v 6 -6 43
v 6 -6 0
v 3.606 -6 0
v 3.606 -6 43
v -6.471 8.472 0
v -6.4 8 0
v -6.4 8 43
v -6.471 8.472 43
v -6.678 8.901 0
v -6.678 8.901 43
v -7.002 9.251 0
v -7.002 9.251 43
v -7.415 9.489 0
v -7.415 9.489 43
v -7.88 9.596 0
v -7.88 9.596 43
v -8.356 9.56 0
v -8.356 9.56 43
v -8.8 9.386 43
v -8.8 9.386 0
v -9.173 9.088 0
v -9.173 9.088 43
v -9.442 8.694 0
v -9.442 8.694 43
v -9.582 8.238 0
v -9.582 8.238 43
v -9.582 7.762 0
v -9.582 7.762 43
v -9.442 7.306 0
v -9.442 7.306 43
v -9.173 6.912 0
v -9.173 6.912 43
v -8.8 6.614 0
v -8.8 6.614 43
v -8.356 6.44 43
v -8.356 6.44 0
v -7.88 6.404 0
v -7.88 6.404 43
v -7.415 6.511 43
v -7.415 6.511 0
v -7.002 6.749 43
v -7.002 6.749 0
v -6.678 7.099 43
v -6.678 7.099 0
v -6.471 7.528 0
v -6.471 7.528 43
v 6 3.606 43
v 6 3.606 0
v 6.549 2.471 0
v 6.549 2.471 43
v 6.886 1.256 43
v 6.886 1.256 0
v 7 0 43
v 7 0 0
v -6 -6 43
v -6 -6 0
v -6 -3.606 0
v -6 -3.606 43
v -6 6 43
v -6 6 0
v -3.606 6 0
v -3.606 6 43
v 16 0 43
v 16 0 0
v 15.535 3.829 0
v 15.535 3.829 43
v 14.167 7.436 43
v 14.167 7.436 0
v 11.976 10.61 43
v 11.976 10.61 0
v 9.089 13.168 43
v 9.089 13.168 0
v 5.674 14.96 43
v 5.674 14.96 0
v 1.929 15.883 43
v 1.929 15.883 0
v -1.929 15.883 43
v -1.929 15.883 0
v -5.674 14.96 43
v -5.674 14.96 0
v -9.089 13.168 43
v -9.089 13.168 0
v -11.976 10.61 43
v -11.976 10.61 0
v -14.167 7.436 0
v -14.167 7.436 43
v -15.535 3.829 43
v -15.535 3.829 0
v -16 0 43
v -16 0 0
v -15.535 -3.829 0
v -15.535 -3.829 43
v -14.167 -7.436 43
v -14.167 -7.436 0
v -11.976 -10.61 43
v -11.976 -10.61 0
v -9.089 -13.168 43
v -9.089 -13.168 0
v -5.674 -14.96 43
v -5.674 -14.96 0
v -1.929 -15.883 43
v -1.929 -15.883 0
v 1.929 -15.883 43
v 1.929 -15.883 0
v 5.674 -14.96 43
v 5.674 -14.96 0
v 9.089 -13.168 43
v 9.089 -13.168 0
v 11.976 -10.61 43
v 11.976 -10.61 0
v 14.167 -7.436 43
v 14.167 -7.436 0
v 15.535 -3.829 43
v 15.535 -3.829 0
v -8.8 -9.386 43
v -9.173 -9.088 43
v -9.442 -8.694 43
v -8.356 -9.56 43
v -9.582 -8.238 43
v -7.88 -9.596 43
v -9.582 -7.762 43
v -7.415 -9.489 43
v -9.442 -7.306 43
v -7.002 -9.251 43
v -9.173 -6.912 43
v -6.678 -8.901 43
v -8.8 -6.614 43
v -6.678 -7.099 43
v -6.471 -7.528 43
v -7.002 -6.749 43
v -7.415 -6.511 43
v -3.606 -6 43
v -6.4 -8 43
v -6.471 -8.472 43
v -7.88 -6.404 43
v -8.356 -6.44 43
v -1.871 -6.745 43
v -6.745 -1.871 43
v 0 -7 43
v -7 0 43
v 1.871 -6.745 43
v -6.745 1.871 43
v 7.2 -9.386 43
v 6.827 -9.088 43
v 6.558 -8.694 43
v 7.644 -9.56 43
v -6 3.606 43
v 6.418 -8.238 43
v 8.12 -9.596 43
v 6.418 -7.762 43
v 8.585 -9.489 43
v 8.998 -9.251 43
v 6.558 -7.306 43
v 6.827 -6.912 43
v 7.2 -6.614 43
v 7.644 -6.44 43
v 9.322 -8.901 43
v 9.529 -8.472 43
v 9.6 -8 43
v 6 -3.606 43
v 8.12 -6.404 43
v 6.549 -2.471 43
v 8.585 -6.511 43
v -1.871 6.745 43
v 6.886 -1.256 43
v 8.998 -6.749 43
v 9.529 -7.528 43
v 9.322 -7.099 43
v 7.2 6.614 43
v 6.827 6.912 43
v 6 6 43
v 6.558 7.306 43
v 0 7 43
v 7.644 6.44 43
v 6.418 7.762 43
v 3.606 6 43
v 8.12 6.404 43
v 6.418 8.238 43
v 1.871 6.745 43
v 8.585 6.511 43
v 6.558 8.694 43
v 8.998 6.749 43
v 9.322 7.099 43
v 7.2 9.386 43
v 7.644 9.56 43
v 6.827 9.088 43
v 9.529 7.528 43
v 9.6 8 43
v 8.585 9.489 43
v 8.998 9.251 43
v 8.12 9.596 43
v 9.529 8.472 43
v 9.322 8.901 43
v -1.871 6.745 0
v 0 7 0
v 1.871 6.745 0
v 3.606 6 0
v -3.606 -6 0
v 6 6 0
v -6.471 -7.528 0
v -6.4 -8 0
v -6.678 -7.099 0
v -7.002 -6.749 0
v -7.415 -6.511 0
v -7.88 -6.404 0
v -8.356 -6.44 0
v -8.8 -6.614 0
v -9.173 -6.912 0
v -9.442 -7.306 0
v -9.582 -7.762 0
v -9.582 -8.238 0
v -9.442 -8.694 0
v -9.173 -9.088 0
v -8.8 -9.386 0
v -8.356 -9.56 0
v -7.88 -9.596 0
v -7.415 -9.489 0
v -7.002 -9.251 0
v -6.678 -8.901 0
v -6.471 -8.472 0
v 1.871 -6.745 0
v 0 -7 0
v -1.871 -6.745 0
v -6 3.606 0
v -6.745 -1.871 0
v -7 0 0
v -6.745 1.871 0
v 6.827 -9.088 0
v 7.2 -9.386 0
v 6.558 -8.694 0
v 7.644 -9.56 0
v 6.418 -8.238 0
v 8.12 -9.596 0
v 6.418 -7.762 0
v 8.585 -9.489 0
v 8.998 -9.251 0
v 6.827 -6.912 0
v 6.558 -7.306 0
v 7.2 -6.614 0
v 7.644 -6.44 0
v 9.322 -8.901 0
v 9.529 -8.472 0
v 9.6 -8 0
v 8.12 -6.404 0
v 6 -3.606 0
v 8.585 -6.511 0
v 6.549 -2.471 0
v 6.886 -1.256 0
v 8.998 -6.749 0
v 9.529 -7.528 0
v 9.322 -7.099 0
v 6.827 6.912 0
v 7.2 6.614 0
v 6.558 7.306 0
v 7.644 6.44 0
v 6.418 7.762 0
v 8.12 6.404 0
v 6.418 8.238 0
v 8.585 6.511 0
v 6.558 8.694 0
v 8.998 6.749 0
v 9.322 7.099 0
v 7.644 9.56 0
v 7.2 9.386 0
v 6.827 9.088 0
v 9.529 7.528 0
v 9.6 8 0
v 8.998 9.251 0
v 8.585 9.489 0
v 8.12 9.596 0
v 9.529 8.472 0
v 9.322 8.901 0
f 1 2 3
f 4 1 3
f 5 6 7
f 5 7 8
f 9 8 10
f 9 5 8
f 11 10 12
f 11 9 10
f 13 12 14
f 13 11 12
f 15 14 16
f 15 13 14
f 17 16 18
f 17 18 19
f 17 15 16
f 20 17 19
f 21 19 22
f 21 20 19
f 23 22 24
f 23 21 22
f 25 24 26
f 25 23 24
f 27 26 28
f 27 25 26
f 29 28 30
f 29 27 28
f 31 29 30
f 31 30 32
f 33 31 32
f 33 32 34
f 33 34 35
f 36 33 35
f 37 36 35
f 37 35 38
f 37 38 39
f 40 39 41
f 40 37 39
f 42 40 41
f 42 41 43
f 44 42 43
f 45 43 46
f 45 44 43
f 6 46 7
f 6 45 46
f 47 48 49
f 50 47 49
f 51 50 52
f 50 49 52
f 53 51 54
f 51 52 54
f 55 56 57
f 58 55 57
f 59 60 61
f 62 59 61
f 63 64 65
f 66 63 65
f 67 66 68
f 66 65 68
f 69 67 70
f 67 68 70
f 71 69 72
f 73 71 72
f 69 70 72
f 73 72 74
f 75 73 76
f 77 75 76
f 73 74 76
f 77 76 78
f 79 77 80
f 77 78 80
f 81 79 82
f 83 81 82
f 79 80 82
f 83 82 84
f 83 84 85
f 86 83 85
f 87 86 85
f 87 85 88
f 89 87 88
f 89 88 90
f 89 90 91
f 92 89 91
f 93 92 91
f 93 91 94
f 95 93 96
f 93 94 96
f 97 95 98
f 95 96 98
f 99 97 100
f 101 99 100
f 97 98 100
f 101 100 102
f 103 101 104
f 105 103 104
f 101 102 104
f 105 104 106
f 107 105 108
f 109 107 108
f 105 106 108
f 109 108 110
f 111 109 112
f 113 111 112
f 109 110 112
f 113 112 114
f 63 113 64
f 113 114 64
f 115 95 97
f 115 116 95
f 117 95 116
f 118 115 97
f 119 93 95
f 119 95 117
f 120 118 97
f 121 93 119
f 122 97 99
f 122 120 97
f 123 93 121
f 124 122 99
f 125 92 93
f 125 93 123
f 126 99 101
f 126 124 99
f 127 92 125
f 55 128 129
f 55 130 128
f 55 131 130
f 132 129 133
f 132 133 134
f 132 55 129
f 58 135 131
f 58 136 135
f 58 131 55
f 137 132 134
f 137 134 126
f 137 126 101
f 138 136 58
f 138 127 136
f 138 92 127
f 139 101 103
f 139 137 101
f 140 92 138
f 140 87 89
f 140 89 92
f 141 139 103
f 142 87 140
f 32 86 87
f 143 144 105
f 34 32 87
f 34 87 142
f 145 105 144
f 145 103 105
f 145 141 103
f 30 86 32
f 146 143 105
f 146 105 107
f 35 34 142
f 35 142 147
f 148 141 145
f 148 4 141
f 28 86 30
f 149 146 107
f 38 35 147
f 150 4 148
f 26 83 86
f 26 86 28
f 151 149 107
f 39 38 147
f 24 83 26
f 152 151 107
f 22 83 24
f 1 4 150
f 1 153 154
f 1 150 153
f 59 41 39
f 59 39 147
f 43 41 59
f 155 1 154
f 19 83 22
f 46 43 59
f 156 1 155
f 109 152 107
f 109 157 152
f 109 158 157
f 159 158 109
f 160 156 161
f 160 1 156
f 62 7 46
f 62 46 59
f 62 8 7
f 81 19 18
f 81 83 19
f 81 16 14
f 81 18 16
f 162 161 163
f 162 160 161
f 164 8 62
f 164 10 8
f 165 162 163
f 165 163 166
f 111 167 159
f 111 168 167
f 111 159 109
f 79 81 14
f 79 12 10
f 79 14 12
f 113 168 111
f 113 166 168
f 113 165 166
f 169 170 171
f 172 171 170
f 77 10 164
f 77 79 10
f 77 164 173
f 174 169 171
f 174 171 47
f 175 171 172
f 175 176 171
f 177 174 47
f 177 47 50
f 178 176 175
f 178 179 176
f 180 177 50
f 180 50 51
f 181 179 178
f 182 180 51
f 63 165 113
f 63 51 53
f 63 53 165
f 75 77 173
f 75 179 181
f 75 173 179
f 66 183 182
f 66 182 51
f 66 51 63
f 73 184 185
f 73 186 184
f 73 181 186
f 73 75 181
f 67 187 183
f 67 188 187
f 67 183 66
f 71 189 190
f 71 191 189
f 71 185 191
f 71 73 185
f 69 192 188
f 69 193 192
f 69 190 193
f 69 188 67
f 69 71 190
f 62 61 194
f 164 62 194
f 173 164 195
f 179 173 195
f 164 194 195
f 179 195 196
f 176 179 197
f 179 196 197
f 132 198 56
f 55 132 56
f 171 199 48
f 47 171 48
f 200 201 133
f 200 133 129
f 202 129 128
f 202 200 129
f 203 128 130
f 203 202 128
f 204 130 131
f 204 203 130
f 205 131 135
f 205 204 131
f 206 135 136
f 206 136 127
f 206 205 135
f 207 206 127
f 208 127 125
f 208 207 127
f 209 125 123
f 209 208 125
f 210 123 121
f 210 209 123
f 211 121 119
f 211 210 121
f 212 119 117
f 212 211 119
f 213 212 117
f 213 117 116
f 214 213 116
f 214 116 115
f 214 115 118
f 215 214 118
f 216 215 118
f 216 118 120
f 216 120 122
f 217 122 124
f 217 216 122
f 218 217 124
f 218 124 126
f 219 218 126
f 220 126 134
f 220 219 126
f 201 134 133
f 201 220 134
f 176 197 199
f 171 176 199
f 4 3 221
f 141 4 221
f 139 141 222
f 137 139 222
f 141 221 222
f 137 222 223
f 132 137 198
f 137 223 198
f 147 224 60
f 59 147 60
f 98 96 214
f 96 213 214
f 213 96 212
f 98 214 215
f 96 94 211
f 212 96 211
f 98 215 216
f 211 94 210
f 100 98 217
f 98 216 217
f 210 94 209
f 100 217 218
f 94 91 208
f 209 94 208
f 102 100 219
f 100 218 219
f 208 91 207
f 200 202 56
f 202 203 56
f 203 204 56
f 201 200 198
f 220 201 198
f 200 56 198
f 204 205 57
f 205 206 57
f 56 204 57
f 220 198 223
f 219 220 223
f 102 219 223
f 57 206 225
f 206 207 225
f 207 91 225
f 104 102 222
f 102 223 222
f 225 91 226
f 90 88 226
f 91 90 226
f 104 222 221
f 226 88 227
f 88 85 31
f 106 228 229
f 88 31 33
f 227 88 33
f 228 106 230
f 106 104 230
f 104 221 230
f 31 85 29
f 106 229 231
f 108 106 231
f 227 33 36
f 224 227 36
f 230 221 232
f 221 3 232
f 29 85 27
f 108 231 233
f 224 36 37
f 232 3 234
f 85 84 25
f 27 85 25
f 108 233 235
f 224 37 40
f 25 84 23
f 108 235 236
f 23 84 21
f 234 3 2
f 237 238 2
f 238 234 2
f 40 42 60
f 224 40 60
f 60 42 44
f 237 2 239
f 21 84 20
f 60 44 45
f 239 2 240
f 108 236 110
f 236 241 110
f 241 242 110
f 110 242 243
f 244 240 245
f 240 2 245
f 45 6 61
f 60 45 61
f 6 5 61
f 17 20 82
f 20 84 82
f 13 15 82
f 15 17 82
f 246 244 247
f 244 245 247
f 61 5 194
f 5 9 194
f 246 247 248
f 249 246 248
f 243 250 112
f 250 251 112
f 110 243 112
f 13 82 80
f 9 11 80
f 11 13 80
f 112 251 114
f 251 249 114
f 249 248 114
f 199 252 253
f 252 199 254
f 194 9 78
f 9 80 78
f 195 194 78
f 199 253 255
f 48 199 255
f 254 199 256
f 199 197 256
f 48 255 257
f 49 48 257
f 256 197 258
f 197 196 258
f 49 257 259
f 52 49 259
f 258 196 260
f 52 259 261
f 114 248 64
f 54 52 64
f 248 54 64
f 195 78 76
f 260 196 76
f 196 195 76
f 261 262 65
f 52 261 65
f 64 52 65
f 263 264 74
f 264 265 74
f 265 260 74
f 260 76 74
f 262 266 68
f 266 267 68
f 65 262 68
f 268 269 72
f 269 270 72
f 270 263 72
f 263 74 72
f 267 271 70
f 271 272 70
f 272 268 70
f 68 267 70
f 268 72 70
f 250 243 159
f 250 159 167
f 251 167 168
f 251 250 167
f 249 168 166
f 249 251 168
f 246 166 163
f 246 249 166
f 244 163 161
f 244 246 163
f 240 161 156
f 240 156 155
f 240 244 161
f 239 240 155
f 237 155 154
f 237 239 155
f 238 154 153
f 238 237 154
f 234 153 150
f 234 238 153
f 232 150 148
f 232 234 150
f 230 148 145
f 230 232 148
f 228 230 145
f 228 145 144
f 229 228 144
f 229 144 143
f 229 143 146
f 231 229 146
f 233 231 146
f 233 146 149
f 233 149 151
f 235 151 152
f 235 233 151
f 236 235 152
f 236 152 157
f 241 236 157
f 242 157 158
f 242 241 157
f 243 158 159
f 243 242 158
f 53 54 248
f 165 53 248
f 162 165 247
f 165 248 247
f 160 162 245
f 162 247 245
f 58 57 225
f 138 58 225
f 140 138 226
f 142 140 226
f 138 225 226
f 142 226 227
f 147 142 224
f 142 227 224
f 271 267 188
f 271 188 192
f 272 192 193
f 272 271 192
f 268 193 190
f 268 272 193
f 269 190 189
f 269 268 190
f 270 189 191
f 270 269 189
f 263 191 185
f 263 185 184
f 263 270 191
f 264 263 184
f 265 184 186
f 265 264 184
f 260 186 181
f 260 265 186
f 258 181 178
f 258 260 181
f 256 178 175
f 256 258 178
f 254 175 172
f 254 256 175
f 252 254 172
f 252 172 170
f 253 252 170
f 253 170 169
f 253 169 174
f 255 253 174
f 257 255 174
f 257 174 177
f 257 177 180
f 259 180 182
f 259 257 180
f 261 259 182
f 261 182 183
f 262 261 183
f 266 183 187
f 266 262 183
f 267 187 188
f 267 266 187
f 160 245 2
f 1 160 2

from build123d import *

# Parameters (mm, degrees)
SKETCH1_R           = 16
SKETCH1_R_2         = 1.6
BOSS_EXTRUDE1_DEPTH = 43


with BuildPart() as part:
    # Sketch1 → Boss-Extrude1 (new body)
    with BuildSketch(Plane.XY):
        Circle(SKETCH1_R)
        with Locations((-8, -8)):
            Circle(SKETCH1_R_2, mode=Mode.SUBTRACT)
        with Locations((8, -8)):
            Circle(SKETCH1_R_2, mode=Mode.SUBTRACT)
        with Locations((-8, 8)):
            Circle(SKETCH1_R_2, mode=Mode.SUBTRACT)
        with BuildLine():
            Line((-3.605551275, -6), (-6, -6))
            Line((-6, -6), (-6, -3.605551275))
            ThreePointArc((-6, -3.605551275), (-7, 0), (-6, 3.605551275))
            Line((-6, 3.605551275), (-6, 6))
            Line((-6, 6), (-3.605551275, 6))
            ThreePointArc((-3.605551275, 6), (0, 7), (3.605551275, 6))
            Line((3.605551275, 6), (6, 6))
            Line((6, 6), (6, 3.605551275))
            ThreePointArc((6, 3.605551275), (6.745368782, 1.870828693), (7, 0))
            ThreePointArc((7, 0), (6.745368782, -1.870828693), (6, -3.605551275))
            Line((6, -3.605551275), (6, -6))
            Line((6, -6), (3.605551275, -6))
            ThreePointArc((3.605551275, -6), (0, -7), (-3.605551275, -6))
        make_face(mode=Mode.SUBTRACT)
        with Locations((8, 8)):
            Circle(SKETCH1_R_2, mode=Mode.SUBTRACT)
    extrude(amount=BOSS_EXTRUDE1_DEPTH)


solid = part.part
